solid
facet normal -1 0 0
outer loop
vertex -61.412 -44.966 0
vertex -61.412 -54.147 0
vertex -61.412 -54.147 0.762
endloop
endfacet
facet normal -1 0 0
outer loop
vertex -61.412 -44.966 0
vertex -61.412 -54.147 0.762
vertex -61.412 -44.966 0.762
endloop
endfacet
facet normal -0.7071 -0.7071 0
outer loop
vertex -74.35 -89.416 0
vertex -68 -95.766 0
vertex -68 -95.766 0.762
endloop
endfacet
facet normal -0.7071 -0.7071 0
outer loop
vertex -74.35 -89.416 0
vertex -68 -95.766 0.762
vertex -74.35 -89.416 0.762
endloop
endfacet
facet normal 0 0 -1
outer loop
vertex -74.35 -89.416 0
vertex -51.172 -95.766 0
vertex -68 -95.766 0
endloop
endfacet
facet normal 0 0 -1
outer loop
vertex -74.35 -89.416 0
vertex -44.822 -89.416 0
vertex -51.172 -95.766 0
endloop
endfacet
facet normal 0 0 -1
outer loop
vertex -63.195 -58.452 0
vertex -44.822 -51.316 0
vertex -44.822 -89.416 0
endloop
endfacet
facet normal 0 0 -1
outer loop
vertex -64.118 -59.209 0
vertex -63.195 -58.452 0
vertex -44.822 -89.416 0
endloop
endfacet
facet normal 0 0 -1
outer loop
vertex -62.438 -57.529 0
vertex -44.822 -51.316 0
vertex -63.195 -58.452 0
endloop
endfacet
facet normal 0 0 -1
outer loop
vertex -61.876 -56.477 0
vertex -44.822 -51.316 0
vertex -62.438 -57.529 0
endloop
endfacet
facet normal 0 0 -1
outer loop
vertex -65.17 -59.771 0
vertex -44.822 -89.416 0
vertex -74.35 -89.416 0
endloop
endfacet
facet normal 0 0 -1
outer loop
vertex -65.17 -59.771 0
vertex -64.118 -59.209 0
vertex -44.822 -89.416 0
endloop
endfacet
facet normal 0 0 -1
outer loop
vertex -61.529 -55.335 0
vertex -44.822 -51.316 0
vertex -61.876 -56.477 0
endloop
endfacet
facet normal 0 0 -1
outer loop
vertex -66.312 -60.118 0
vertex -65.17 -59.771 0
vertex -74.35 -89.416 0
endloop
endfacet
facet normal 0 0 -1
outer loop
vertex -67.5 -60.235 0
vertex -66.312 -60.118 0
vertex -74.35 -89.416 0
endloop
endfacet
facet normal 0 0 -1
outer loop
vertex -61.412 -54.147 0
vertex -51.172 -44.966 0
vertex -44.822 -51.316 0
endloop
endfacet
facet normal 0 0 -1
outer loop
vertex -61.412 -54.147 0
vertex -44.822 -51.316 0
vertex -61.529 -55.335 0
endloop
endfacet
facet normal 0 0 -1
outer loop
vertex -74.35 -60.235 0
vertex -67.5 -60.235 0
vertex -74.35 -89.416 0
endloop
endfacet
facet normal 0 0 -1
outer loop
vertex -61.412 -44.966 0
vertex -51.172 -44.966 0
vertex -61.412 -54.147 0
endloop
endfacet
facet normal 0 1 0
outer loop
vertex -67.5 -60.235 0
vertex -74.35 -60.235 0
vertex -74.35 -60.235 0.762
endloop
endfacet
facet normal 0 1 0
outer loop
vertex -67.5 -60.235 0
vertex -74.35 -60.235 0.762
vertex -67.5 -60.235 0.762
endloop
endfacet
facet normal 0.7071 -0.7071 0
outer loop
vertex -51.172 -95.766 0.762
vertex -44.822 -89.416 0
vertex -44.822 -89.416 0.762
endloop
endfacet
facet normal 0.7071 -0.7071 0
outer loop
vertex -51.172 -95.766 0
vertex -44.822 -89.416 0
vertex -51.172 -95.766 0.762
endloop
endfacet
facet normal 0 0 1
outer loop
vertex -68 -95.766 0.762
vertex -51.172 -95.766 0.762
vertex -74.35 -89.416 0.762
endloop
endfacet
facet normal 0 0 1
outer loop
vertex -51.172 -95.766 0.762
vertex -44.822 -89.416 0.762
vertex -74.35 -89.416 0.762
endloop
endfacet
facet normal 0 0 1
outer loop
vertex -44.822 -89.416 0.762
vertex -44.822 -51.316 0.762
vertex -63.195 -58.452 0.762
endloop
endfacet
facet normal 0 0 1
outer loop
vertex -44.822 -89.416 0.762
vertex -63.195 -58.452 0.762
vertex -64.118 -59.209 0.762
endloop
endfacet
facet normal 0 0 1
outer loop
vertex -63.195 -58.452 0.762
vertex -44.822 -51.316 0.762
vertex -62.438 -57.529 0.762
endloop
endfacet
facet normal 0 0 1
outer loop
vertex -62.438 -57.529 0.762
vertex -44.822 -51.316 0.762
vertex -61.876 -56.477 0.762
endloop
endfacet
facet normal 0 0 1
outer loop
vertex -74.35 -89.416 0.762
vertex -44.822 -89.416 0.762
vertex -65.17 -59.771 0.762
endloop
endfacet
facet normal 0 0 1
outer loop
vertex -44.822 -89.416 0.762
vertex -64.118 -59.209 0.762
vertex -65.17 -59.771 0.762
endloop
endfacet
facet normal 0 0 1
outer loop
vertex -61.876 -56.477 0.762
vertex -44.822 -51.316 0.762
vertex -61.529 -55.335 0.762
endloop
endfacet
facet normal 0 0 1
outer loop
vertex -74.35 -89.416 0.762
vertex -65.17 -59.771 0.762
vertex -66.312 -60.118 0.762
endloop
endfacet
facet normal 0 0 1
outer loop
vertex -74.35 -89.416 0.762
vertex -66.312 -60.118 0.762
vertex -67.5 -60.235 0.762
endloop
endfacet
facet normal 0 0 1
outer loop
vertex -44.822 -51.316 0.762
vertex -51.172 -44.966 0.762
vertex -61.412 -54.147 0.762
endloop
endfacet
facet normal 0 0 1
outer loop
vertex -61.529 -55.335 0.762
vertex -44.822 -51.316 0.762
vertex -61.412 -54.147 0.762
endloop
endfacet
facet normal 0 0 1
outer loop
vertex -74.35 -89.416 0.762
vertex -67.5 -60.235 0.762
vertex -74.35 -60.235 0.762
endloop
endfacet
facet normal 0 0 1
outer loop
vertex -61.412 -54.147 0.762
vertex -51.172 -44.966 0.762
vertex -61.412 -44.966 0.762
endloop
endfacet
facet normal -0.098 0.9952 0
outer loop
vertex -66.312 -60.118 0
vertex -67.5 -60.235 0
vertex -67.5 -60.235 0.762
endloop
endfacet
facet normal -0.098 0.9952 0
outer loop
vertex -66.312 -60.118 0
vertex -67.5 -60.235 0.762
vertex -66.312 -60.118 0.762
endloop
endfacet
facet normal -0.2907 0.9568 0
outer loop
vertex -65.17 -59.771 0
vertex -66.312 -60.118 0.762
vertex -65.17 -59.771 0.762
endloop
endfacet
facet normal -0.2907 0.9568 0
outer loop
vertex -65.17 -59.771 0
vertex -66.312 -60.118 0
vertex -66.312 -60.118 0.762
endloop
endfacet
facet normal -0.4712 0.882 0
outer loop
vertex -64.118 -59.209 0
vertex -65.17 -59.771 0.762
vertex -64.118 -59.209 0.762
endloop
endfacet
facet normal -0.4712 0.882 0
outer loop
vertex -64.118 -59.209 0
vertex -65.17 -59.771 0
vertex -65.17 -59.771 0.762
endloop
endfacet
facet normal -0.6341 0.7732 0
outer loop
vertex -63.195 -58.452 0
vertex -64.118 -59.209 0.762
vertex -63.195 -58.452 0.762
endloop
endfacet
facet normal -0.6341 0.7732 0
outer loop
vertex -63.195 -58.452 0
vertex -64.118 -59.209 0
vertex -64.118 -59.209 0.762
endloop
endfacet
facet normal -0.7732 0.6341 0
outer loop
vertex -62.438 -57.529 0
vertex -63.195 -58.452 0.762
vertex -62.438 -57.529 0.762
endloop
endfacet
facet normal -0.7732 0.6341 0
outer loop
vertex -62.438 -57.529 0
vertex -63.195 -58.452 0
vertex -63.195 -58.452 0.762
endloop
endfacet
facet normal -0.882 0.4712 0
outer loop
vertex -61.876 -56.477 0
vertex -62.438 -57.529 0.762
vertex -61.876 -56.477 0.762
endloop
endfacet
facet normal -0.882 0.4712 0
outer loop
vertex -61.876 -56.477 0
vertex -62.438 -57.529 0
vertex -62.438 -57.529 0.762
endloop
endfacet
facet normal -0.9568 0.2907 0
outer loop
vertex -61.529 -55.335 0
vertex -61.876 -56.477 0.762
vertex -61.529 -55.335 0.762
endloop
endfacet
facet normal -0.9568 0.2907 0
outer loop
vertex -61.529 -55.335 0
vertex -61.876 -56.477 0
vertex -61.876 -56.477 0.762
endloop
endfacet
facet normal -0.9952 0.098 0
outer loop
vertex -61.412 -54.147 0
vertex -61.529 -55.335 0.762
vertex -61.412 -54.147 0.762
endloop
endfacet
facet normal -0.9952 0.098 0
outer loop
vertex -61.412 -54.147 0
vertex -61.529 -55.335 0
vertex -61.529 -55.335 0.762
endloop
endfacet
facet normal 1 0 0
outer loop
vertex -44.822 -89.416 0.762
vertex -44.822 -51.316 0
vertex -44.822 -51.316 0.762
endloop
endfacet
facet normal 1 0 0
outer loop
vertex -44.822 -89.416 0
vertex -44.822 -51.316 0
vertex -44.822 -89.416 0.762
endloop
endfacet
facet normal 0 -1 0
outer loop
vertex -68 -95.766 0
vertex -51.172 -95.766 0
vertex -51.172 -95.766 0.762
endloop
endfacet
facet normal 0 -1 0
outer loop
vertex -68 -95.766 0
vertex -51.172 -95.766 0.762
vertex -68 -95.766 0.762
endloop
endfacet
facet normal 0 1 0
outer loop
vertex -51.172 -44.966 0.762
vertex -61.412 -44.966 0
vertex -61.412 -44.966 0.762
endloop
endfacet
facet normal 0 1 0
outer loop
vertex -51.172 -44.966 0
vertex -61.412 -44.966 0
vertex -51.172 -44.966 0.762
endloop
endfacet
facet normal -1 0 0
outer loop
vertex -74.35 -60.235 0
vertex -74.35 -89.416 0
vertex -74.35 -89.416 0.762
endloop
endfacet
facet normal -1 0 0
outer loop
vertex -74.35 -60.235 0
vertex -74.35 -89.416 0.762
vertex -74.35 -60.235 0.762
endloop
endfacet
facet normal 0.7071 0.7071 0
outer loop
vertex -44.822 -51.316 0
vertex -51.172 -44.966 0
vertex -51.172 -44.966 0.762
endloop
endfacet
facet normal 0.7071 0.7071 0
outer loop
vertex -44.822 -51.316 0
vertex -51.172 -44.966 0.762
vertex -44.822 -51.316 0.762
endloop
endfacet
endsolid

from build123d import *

# Parameters (mm, degrees)
BOSS_EXTRUDE1_DEPTH = 0.762


with BuildPart() as part:
    # Sketch1 → Boss-Extrude1 (new body)
    with BuildSketch(Plane.XY):
        with BuildLine():
            Line((-51.1725, -95.766078244), (-68, -95.766078244))
            Line((-68, -95.766078244), (-74.35, -89.416078244))
            Line((-74.35, -89.416078244), (-74.35, -60.234654728))
            Line((-74.35, -60.234654728), (-67.5, -60.234654728))
            ThreePointArc((-67.5, -60.234654728), (-63.19548747, -58.451667258), (-61.4125, -54.147154728))
            Line((-61.4125, -54.147154728), (-61.4125, -44.966078244))
            Line((-61.4125, -44.966078244), (-51.1725, -44.966078244))
            Line((-51.1725, -44.966078244), (-44.8225, -51.316078244))
            Line((-44.8225, -51.316078244), (-44.8225, -89.416078244))
            Line((-44.8225, -89.416078244), (-51.1725, -95.766078244))
        make_face()
    extrude(amount=BOSS_EXTRUDE1_DEPTH)


solid = part.part
